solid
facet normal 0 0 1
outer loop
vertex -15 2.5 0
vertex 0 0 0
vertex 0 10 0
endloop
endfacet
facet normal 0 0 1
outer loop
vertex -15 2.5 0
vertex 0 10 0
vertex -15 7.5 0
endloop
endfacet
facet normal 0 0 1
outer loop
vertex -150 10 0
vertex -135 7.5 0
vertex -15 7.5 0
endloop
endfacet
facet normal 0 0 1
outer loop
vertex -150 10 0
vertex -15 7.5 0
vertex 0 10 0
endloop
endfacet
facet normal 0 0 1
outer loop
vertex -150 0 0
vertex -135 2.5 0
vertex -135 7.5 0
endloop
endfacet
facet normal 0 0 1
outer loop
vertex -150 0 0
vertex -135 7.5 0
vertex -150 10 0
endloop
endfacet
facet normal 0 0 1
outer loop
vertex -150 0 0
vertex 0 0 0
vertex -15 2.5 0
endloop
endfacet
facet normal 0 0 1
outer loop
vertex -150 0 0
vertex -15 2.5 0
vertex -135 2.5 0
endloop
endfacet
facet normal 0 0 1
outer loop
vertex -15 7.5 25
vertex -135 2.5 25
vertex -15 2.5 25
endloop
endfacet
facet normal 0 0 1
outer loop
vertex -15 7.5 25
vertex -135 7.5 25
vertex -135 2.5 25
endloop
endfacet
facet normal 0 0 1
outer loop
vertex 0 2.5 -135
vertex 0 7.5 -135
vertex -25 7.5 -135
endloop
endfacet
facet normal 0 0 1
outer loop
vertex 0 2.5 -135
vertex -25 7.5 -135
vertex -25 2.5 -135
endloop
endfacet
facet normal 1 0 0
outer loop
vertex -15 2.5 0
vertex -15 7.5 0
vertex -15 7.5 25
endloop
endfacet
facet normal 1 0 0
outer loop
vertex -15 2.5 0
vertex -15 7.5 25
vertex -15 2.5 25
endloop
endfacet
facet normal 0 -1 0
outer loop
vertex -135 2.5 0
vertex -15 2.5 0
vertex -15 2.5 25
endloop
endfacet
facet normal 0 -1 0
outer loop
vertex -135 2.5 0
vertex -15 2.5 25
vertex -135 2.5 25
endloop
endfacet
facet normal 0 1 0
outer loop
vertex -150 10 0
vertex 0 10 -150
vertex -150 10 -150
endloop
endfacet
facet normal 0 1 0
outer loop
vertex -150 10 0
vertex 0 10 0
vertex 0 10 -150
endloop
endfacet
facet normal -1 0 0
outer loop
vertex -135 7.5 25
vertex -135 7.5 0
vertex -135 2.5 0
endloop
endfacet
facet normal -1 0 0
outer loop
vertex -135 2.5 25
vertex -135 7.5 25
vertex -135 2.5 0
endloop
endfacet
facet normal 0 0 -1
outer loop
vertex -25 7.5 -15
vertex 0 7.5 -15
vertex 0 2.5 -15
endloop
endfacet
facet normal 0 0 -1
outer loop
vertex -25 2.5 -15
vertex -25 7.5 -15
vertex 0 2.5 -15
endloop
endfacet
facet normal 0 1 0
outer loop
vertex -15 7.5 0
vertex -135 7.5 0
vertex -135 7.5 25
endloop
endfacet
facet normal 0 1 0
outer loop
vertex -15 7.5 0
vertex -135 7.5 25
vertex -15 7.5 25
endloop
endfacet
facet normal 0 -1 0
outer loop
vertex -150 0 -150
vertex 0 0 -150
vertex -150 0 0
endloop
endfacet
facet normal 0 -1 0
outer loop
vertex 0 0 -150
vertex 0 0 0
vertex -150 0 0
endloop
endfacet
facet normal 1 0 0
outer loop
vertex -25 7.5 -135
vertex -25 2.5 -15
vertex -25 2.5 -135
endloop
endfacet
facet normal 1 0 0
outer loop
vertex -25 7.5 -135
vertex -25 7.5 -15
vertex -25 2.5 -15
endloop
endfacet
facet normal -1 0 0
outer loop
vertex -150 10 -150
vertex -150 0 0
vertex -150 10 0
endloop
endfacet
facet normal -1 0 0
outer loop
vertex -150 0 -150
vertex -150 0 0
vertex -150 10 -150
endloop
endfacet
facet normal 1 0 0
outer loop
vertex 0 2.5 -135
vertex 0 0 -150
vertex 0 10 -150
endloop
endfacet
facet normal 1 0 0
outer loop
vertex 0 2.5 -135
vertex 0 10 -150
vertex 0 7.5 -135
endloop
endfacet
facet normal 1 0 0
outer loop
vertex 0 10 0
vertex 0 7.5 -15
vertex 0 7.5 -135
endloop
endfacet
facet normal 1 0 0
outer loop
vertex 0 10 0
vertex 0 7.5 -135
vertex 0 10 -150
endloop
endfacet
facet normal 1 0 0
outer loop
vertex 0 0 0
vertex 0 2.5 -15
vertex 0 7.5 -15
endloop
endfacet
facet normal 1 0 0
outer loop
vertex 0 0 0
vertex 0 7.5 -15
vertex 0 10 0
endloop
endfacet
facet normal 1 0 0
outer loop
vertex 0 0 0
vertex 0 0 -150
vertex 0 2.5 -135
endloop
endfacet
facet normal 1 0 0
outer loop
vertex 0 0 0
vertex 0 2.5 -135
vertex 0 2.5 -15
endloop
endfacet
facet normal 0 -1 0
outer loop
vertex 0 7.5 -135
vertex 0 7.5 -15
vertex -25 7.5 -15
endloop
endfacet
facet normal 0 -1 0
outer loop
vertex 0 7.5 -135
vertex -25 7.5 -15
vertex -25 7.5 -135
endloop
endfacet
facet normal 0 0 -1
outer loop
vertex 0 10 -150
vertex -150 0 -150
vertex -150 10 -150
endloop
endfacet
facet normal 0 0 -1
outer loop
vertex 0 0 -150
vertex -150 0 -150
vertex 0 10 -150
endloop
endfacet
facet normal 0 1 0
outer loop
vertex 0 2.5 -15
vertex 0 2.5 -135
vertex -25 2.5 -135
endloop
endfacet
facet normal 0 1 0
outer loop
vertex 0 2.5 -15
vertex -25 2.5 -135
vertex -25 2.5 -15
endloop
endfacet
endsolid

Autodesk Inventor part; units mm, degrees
ref_plane "YZ Plane" through (0, 0, 0) normal (1, 0, 0) x (0, 1, 0)
ref_plane "XZ Plane" through (0, 0, 0) normal (0, 1, 0) x (-1, 0, 0)
ref_plane "XY Plane" through (0, 0, 0) normal (0, 0, 1) x (1, 0, 0)
sketch "Sketch1" plane through (0, 0, 0) normal (0, 1, 0) x (-1, 0, 0)
  line L0 (0, 0) -> (150, 0)
  line L1 (150, 0) -> (150, -150)
  line L2 (150, -150) -> (0, -150)
  line L3 (0, -150) -> (0, 0)
  dimension "d0" = 150
  dimension "d1" = 150
extrude "Extrusion1" add sketch "Sketch1" along normal blind 10
sketch "Sketch2" plane through (-150, 0, 0) normal (0, 0, 1) x (1, 0, 0)
  line L0 (0, 0) -> (0, 10) projected
  line L1 (150, 0) -> (150, 10) projected
  line L2 (0, 7.5) -> (150, 7.5)
  line L3 (150, 7.5) -> (150, 2.5)
  line L4 (150, 2.5) -> (0, 2.5)
  line L5 (0, 2.5) -> (0, 7.5)
  line L6 (150, 7.5) -> (135, 7.5)
  line L7 (135, 7.5) -> (135, 2.5)
  line L8 (135, 2.5) -> (150, 2.5)
  line L9 (150, 2.5) -> (150, 7.5)
  line L10 (0, 7.5) -> (15, 7.5)
  line L11 (15, 7.5) -> (15, 2.5)
  line L12 (15, 2.5) -> (0, 2.5)
  line L13 (0, 2.5) -> (0, 7.5)
  point P0 (135, 2.5)
  point P1 (135, 7.5)
  dimension "d4" = 5
  dimension "d5" = 15
  dimension "d6" = 5
  dimension "d7" = 15
  dimension "d8" = 5
sketch "Sketch3" plane through (0, 0, 0) normal (1, 0, 0) x (0, 0, -1)
  line L0 (0, 0) -> (0, 10) projected
  line L1 (0, 7.5) -> (150, 7.5)
  line L2 (150, 7.5) -> (150, 2.5)
  line L3 (150, 2.5) -> (0, 2.5)
  line L4 (0, 2.5) -> (0, 7.5)
  line L5 (0, 7.5) -> (15, 7.5)
  line L6 (15, 7.5) -> (15, 2.5)
  line L7 (15, 2.5) -> (0, 2.5)
  line L8 (0, 2.5) -> (0, 7.5)
  line L9 (150, 7.5) -> (135, 7.5)
  line L10 (135, 7.5) -> (135, 2.5)
  line L11 (135, 2.5) -> (150, 2.5)
  line L12 (150, 2.5) -> (150, 7.5)
  dimension "d9" = 150
  dimension "d10" = 5
  dimension "d11" = 15
  dimension "d12" = 5
  dimension "d13" = 15
  dimension "d14" = 5
extrude "Extrusion2" add sketch "Sketch2" along normal blind 25 contours L11 L2 L7 L4
extrude "Extrusion3" cut sketch "Sketch3" against normal blind 25 contours L6 L1 L10 L3
properties part number "TSU_MF_Floor"
